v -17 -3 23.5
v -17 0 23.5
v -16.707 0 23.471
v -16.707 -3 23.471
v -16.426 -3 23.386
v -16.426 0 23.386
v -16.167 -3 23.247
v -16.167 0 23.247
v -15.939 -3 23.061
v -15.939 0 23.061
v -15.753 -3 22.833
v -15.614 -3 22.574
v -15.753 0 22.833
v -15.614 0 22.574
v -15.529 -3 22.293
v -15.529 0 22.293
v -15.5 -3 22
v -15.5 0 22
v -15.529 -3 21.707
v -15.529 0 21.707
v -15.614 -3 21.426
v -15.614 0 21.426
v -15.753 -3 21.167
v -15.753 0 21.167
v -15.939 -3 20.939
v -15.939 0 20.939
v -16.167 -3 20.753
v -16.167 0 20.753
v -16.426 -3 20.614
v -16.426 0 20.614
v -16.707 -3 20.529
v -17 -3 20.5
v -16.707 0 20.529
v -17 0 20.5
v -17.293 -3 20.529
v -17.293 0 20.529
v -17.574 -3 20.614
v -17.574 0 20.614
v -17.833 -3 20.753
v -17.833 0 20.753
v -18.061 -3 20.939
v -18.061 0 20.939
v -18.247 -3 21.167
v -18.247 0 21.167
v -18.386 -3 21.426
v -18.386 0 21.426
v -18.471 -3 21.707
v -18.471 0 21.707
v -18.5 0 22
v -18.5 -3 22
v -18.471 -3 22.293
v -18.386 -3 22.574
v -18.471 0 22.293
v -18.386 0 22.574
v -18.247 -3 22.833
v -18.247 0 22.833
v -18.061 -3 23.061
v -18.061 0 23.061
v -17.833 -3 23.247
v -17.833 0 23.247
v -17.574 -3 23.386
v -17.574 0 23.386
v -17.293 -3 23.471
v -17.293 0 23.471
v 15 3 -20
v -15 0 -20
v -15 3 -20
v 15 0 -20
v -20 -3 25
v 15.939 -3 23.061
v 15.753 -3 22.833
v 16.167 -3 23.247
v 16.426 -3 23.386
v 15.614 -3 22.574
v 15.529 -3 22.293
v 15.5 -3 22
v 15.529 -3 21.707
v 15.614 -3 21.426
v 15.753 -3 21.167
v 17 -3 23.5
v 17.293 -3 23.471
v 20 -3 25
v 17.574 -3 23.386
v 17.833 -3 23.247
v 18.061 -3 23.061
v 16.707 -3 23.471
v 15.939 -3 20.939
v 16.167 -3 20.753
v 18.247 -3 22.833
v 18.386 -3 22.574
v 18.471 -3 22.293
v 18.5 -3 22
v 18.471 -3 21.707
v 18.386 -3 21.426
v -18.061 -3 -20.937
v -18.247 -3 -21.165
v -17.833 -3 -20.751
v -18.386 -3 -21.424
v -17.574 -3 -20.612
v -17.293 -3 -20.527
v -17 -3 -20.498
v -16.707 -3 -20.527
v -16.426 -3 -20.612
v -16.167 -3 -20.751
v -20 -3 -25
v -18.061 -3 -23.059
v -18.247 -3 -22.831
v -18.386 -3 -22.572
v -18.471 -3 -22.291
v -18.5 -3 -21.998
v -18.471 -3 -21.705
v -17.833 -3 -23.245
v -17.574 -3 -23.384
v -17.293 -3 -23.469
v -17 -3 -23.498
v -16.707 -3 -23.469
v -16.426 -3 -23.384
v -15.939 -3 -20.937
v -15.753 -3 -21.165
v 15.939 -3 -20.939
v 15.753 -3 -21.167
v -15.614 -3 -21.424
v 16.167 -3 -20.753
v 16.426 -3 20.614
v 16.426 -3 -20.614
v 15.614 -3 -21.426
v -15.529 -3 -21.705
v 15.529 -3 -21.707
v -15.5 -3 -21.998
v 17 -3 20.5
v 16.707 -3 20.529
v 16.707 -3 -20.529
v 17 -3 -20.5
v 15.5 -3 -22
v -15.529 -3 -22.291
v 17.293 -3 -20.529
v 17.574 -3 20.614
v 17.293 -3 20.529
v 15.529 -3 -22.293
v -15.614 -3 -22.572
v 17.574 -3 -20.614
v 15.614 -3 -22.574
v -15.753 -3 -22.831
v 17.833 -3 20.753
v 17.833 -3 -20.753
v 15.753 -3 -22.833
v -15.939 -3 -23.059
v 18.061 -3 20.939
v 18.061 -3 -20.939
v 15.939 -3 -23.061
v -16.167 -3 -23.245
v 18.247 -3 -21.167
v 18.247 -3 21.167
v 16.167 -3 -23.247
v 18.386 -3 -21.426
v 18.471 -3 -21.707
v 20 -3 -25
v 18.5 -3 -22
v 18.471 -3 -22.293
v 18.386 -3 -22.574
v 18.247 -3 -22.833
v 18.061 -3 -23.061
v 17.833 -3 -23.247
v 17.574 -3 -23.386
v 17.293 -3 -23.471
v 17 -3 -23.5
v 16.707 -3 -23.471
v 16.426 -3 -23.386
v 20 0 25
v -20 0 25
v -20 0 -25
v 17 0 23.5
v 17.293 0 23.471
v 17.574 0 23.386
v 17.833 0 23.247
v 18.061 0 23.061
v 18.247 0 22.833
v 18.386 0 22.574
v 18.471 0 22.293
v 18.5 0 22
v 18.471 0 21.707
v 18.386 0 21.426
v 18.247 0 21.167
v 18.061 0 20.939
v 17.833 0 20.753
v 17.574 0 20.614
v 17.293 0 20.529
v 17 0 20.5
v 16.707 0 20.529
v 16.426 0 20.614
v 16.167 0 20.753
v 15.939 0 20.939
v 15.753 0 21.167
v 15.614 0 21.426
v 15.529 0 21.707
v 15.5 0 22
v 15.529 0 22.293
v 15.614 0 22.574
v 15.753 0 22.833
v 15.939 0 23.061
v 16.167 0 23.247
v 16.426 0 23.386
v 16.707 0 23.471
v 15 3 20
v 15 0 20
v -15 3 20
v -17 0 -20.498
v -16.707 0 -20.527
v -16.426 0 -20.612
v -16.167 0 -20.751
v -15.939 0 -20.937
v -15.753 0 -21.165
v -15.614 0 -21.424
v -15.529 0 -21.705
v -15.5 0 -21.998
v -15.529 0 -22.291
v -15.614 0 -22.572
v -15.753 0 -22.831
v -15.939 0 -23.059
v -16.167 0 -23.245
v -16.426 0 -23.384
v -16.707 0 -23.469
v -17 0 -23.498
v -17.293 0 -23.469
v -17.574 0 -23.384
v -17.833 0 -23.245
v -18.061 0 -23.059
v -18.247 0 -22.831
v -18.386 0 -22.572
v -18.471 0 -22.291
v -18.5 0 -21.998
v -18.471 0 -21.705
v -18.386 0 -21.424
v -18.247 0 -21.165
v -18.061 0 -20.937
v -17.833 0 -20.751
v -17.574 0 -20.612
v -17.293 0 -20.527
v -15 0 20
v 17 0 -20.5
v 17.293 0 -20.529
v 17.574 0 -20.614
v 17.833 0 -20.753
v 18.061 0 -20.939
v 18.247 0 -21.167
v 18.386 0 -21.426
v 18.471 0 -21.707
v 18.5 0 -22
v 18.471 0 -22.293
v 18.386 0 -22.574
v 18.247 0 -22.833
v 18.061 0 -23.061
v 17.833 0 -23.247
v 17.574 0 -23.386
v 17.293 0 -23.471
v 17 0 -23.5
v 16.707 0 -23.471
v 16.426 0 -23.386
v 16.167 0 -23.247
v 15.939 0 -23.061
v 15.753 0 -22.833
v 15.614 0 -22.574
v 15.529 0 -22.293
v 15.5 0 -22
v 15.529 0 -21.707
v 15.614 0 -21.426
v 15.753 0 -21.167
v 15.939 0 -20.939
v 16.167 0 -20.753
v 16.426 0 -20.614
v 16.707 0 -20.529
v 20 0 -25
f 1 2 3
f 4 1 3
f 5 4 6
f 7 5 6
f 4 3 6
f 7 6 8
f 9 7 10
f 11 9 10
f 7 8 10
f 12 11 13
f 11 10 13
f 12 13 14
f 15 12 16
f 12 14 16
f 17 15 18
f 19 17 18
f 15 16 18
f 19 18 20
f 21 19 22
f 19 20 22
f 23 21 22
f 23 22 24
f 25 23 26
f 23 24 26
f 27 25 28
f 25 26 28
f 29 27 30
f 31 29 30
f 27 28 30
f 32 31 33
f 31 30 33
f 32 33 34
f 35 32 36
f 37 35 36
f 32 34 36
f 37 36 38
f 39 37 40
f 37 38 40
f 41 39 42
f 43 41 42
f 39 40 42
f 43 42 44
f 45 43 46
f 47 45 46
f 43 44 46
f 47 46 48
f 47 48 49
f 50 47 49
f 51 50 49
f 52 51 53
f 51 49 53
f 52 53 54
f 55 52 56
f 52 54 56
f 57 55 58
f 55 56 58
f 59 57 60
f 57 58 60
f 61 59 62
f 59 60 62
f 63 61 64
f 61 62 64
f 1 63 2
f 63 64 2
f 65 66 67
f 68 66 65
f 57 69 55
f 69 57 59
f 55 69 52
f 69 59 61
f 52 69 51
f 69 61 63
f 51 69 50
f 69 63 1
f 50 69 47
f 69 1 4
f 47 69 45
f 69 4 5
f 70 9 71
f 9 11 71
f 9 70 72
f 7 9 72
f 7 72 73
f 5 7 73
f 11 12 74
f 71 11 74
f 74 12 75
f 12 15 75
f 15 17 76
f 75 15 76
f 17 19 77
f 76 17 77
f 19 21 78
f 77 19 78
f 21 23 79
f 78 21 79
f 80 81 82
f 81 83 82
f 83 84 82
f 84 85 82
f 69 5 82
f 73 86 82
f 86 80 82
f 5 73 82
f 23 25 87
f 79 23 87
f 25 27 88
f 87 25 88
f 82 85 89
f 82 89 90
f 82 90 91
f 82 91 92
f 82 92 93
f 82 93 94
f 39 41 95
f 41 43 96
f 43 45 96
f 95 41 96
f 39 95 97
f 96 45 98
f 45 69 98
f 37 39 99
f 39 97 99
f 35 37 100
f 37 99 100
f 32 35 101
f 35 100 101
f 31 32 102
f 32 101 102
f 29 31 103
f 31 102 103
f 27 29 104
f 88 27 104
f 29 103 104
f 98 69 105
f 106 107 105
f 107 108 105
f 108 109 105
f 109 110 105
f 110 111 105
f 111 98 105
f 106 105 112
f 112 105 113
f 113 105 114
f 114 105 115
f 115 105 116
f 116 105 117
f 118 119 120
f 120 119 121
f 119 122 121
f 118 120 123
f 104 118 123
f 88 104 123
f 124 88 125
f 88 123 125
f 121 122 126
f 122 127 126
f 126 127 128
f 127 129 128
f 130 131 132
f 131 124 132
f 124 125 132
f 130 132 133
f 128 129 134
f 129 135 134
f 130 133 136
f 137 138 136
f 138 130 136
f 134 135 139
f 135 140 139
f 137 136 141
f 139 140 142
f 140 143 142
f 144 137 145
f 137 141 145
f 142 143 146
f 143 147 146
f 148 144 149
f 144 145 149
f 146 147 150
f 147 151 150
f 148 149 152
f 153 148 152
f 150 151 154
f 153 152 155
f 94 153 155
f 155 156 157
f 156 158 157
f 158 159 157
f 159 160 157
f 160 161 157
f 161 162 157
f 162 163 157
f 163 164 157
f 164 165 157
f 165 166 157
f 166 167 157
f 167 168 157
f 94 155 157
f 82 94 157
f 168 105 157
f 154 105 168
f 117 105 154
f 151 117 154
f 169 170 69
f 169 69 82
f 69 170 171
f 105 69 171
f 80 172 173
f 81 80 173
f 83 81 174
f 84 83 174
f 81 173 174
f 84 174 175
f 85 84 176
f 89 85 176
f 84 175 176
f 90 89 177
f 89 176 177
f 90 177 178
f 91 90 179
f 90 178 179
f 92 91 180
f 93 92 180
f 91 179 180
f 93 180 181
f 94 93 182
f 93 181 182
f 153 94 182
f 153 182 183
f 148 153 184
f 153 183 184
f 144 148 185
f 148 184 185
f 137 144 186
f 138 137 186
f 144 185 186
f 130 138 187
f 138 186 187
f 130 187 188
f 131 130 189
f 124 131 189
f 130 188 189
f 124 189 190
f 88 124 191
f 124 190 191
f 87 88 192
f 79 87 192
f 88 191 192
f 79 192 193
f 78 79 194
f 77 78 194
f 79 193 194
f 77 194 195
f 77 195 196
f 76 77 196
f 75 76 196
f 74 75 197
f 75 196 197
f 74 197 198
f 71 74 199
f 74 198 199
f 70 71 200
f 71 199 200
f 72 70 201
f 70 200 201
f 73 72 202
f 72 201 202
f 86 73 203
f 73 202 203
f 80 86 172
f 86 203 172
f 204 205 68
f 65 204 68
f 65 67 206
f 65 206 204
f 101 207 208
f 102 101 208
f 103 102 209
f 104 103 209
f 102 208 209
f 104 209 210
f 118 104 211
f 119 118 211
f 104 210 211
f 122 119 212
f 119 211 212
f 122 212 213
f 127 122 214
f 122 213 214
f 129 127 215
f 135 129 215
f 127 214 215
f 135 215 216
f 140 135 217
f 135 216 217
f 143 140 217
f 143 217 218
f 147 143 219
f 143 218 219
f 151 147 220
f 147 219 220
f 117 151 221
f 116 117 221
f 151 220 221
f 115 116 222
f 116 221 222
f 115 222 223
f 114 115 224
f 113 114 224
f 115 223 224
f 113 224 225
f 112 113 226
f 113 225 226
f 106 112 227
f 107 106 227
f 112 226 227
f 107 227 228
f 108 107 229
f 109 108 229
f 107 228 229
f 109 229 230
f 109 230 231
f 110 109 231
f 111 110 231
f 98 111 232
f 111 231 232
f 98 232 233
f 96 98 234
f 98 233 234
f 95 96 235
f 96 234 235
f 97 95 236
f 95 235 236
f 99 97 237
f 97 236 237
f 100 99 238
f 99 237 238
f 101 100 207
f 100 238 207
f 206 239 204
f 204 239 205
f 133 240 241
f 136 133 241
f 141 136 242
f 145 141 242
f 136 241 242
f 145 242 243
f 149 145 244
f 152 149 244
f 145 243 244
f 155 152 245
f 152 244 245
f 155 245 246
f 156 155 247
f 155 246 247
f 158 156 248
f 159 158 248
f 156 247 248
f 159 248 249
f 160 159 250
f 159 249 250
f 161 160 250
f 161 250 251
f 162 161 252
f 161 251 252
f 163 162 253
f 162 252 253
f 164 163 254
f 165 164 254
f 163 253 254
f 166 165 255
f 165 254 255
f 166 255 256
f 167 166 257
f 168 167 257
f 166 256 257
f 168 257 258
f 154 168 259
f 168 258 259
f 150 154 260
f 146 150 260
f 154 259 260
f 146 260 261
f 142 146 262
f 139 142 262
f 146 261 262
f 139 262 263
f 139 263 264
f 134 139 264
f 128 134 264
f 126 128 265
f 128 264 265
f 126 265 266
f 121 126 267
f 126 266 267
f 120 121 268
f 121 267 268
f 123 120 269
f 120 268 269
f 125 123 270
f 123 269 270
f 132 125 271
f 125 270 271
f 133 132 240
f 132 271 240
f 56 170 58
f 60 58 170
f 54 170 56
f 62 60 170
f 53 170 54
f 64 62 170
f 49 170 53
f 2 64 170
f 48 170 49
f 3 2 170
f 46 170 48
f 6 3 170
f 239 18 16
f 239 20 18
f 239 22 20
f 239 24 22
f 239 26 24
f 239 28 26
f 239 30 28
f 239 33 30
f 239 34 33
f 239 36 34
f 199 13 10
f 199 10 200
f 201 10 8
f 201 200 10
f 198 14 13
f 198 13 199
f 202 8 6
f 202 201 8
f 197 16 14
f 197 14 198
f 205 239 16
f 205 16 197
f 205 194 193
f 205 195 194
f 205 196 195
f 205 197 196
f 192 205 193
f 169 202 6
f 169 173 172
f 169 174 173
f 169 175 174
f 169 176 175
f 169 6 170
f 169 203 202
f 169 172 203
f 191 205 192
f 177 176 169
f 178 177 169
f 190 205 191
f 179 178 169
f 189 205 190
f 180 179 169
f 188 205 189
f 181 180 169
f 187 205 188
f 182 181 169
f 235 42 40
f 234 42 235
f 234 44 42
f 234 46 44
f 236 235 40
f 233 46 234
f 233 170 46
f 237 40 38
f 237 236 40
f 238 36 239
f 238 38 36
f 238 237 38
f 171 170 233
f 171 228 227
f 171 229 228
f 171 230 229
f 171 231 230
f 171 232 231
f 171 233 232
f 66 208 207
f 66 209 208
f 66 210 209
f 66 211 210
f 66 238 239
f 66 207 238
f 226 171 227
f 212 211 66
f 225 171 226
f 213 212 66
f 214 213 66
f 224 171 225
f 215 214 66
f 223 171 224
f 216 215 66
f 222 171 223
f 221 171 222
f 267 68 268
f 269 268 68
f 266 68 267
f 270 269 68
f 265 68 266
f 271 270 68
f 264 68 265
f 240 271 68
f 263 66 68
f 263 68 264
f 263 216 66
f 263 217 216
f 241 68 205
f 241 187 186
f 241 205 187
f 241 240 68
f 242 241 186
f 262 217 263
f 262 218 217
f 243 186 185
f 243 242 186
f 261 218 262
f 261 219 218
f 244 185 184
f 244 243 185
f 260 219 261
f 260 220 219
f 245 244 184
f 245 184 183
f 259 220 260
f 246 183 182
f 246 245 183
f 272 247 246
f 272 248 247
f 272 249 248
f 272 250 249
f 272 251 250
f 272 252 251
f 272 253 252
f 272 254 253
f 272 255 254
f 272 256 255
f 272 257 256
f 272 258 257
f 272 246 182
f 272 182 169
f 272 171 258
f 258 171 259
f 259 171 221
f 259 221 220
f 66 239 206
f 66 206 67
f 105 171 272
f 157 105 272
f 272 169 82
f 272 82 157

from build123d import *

# Parameters (mm, degrees)
SKETCH1_W           = 30
SKETCH1_H           = 40
BOSS_EXTRUDE1_DEPTH = 3
SKETCH2_W           = 40
SKETCH2_H           = 50
SKETCH2_R           = 1.5
BOSS_EXTRUDE2_DEPTH = 3


with BuildPart() as part:
    # Sketch1 → Boss-Extrude1 (new body)
    with BuildSketch(Plane(origin=(0, 0, 0), x_dir=(1, 0, 0), z_dir=(0, 1, 0))):
        Rectangle(SKETCH1_W, SKETCH1_H)
    extrude(amount=BOSS_EXTRUDE1_DEPTH)

    # Sketch2 → Boss-Extrude2 (add)
    with BuildSketch(Plane(origin=(0, 0, 0), x_dir=(1, 0, 0), z_dir=(0, 1, 0))):
        Rectangle(SKETCH2_W, SKETCH2_H)
        with Locations(Location((-17, 21.998038487, 0), (0, 0, 270))):
            Circle(SKETCH2_R, mode=Mode.SUBTRACT)
        with Locations(Location((17, 22, 0), (0, 0, 270))):
            Circle(SKETCH2_R, mode=Mode.SUBTRACT)
        with Locations(Location((17, -22, 0), (0, 0, 270))):
            Circle(SKETCH2_R, mode=Mode.SUBTRACT)
        with Locations(Location((-17, -22, 0), (0, 0, 270))):
            Circle(SKETCH2_R, mode=Mode.SUBTRACT)
    extrude(amount=-BOSS_EXTRUDE2_DEPTH)


solid = part.part
